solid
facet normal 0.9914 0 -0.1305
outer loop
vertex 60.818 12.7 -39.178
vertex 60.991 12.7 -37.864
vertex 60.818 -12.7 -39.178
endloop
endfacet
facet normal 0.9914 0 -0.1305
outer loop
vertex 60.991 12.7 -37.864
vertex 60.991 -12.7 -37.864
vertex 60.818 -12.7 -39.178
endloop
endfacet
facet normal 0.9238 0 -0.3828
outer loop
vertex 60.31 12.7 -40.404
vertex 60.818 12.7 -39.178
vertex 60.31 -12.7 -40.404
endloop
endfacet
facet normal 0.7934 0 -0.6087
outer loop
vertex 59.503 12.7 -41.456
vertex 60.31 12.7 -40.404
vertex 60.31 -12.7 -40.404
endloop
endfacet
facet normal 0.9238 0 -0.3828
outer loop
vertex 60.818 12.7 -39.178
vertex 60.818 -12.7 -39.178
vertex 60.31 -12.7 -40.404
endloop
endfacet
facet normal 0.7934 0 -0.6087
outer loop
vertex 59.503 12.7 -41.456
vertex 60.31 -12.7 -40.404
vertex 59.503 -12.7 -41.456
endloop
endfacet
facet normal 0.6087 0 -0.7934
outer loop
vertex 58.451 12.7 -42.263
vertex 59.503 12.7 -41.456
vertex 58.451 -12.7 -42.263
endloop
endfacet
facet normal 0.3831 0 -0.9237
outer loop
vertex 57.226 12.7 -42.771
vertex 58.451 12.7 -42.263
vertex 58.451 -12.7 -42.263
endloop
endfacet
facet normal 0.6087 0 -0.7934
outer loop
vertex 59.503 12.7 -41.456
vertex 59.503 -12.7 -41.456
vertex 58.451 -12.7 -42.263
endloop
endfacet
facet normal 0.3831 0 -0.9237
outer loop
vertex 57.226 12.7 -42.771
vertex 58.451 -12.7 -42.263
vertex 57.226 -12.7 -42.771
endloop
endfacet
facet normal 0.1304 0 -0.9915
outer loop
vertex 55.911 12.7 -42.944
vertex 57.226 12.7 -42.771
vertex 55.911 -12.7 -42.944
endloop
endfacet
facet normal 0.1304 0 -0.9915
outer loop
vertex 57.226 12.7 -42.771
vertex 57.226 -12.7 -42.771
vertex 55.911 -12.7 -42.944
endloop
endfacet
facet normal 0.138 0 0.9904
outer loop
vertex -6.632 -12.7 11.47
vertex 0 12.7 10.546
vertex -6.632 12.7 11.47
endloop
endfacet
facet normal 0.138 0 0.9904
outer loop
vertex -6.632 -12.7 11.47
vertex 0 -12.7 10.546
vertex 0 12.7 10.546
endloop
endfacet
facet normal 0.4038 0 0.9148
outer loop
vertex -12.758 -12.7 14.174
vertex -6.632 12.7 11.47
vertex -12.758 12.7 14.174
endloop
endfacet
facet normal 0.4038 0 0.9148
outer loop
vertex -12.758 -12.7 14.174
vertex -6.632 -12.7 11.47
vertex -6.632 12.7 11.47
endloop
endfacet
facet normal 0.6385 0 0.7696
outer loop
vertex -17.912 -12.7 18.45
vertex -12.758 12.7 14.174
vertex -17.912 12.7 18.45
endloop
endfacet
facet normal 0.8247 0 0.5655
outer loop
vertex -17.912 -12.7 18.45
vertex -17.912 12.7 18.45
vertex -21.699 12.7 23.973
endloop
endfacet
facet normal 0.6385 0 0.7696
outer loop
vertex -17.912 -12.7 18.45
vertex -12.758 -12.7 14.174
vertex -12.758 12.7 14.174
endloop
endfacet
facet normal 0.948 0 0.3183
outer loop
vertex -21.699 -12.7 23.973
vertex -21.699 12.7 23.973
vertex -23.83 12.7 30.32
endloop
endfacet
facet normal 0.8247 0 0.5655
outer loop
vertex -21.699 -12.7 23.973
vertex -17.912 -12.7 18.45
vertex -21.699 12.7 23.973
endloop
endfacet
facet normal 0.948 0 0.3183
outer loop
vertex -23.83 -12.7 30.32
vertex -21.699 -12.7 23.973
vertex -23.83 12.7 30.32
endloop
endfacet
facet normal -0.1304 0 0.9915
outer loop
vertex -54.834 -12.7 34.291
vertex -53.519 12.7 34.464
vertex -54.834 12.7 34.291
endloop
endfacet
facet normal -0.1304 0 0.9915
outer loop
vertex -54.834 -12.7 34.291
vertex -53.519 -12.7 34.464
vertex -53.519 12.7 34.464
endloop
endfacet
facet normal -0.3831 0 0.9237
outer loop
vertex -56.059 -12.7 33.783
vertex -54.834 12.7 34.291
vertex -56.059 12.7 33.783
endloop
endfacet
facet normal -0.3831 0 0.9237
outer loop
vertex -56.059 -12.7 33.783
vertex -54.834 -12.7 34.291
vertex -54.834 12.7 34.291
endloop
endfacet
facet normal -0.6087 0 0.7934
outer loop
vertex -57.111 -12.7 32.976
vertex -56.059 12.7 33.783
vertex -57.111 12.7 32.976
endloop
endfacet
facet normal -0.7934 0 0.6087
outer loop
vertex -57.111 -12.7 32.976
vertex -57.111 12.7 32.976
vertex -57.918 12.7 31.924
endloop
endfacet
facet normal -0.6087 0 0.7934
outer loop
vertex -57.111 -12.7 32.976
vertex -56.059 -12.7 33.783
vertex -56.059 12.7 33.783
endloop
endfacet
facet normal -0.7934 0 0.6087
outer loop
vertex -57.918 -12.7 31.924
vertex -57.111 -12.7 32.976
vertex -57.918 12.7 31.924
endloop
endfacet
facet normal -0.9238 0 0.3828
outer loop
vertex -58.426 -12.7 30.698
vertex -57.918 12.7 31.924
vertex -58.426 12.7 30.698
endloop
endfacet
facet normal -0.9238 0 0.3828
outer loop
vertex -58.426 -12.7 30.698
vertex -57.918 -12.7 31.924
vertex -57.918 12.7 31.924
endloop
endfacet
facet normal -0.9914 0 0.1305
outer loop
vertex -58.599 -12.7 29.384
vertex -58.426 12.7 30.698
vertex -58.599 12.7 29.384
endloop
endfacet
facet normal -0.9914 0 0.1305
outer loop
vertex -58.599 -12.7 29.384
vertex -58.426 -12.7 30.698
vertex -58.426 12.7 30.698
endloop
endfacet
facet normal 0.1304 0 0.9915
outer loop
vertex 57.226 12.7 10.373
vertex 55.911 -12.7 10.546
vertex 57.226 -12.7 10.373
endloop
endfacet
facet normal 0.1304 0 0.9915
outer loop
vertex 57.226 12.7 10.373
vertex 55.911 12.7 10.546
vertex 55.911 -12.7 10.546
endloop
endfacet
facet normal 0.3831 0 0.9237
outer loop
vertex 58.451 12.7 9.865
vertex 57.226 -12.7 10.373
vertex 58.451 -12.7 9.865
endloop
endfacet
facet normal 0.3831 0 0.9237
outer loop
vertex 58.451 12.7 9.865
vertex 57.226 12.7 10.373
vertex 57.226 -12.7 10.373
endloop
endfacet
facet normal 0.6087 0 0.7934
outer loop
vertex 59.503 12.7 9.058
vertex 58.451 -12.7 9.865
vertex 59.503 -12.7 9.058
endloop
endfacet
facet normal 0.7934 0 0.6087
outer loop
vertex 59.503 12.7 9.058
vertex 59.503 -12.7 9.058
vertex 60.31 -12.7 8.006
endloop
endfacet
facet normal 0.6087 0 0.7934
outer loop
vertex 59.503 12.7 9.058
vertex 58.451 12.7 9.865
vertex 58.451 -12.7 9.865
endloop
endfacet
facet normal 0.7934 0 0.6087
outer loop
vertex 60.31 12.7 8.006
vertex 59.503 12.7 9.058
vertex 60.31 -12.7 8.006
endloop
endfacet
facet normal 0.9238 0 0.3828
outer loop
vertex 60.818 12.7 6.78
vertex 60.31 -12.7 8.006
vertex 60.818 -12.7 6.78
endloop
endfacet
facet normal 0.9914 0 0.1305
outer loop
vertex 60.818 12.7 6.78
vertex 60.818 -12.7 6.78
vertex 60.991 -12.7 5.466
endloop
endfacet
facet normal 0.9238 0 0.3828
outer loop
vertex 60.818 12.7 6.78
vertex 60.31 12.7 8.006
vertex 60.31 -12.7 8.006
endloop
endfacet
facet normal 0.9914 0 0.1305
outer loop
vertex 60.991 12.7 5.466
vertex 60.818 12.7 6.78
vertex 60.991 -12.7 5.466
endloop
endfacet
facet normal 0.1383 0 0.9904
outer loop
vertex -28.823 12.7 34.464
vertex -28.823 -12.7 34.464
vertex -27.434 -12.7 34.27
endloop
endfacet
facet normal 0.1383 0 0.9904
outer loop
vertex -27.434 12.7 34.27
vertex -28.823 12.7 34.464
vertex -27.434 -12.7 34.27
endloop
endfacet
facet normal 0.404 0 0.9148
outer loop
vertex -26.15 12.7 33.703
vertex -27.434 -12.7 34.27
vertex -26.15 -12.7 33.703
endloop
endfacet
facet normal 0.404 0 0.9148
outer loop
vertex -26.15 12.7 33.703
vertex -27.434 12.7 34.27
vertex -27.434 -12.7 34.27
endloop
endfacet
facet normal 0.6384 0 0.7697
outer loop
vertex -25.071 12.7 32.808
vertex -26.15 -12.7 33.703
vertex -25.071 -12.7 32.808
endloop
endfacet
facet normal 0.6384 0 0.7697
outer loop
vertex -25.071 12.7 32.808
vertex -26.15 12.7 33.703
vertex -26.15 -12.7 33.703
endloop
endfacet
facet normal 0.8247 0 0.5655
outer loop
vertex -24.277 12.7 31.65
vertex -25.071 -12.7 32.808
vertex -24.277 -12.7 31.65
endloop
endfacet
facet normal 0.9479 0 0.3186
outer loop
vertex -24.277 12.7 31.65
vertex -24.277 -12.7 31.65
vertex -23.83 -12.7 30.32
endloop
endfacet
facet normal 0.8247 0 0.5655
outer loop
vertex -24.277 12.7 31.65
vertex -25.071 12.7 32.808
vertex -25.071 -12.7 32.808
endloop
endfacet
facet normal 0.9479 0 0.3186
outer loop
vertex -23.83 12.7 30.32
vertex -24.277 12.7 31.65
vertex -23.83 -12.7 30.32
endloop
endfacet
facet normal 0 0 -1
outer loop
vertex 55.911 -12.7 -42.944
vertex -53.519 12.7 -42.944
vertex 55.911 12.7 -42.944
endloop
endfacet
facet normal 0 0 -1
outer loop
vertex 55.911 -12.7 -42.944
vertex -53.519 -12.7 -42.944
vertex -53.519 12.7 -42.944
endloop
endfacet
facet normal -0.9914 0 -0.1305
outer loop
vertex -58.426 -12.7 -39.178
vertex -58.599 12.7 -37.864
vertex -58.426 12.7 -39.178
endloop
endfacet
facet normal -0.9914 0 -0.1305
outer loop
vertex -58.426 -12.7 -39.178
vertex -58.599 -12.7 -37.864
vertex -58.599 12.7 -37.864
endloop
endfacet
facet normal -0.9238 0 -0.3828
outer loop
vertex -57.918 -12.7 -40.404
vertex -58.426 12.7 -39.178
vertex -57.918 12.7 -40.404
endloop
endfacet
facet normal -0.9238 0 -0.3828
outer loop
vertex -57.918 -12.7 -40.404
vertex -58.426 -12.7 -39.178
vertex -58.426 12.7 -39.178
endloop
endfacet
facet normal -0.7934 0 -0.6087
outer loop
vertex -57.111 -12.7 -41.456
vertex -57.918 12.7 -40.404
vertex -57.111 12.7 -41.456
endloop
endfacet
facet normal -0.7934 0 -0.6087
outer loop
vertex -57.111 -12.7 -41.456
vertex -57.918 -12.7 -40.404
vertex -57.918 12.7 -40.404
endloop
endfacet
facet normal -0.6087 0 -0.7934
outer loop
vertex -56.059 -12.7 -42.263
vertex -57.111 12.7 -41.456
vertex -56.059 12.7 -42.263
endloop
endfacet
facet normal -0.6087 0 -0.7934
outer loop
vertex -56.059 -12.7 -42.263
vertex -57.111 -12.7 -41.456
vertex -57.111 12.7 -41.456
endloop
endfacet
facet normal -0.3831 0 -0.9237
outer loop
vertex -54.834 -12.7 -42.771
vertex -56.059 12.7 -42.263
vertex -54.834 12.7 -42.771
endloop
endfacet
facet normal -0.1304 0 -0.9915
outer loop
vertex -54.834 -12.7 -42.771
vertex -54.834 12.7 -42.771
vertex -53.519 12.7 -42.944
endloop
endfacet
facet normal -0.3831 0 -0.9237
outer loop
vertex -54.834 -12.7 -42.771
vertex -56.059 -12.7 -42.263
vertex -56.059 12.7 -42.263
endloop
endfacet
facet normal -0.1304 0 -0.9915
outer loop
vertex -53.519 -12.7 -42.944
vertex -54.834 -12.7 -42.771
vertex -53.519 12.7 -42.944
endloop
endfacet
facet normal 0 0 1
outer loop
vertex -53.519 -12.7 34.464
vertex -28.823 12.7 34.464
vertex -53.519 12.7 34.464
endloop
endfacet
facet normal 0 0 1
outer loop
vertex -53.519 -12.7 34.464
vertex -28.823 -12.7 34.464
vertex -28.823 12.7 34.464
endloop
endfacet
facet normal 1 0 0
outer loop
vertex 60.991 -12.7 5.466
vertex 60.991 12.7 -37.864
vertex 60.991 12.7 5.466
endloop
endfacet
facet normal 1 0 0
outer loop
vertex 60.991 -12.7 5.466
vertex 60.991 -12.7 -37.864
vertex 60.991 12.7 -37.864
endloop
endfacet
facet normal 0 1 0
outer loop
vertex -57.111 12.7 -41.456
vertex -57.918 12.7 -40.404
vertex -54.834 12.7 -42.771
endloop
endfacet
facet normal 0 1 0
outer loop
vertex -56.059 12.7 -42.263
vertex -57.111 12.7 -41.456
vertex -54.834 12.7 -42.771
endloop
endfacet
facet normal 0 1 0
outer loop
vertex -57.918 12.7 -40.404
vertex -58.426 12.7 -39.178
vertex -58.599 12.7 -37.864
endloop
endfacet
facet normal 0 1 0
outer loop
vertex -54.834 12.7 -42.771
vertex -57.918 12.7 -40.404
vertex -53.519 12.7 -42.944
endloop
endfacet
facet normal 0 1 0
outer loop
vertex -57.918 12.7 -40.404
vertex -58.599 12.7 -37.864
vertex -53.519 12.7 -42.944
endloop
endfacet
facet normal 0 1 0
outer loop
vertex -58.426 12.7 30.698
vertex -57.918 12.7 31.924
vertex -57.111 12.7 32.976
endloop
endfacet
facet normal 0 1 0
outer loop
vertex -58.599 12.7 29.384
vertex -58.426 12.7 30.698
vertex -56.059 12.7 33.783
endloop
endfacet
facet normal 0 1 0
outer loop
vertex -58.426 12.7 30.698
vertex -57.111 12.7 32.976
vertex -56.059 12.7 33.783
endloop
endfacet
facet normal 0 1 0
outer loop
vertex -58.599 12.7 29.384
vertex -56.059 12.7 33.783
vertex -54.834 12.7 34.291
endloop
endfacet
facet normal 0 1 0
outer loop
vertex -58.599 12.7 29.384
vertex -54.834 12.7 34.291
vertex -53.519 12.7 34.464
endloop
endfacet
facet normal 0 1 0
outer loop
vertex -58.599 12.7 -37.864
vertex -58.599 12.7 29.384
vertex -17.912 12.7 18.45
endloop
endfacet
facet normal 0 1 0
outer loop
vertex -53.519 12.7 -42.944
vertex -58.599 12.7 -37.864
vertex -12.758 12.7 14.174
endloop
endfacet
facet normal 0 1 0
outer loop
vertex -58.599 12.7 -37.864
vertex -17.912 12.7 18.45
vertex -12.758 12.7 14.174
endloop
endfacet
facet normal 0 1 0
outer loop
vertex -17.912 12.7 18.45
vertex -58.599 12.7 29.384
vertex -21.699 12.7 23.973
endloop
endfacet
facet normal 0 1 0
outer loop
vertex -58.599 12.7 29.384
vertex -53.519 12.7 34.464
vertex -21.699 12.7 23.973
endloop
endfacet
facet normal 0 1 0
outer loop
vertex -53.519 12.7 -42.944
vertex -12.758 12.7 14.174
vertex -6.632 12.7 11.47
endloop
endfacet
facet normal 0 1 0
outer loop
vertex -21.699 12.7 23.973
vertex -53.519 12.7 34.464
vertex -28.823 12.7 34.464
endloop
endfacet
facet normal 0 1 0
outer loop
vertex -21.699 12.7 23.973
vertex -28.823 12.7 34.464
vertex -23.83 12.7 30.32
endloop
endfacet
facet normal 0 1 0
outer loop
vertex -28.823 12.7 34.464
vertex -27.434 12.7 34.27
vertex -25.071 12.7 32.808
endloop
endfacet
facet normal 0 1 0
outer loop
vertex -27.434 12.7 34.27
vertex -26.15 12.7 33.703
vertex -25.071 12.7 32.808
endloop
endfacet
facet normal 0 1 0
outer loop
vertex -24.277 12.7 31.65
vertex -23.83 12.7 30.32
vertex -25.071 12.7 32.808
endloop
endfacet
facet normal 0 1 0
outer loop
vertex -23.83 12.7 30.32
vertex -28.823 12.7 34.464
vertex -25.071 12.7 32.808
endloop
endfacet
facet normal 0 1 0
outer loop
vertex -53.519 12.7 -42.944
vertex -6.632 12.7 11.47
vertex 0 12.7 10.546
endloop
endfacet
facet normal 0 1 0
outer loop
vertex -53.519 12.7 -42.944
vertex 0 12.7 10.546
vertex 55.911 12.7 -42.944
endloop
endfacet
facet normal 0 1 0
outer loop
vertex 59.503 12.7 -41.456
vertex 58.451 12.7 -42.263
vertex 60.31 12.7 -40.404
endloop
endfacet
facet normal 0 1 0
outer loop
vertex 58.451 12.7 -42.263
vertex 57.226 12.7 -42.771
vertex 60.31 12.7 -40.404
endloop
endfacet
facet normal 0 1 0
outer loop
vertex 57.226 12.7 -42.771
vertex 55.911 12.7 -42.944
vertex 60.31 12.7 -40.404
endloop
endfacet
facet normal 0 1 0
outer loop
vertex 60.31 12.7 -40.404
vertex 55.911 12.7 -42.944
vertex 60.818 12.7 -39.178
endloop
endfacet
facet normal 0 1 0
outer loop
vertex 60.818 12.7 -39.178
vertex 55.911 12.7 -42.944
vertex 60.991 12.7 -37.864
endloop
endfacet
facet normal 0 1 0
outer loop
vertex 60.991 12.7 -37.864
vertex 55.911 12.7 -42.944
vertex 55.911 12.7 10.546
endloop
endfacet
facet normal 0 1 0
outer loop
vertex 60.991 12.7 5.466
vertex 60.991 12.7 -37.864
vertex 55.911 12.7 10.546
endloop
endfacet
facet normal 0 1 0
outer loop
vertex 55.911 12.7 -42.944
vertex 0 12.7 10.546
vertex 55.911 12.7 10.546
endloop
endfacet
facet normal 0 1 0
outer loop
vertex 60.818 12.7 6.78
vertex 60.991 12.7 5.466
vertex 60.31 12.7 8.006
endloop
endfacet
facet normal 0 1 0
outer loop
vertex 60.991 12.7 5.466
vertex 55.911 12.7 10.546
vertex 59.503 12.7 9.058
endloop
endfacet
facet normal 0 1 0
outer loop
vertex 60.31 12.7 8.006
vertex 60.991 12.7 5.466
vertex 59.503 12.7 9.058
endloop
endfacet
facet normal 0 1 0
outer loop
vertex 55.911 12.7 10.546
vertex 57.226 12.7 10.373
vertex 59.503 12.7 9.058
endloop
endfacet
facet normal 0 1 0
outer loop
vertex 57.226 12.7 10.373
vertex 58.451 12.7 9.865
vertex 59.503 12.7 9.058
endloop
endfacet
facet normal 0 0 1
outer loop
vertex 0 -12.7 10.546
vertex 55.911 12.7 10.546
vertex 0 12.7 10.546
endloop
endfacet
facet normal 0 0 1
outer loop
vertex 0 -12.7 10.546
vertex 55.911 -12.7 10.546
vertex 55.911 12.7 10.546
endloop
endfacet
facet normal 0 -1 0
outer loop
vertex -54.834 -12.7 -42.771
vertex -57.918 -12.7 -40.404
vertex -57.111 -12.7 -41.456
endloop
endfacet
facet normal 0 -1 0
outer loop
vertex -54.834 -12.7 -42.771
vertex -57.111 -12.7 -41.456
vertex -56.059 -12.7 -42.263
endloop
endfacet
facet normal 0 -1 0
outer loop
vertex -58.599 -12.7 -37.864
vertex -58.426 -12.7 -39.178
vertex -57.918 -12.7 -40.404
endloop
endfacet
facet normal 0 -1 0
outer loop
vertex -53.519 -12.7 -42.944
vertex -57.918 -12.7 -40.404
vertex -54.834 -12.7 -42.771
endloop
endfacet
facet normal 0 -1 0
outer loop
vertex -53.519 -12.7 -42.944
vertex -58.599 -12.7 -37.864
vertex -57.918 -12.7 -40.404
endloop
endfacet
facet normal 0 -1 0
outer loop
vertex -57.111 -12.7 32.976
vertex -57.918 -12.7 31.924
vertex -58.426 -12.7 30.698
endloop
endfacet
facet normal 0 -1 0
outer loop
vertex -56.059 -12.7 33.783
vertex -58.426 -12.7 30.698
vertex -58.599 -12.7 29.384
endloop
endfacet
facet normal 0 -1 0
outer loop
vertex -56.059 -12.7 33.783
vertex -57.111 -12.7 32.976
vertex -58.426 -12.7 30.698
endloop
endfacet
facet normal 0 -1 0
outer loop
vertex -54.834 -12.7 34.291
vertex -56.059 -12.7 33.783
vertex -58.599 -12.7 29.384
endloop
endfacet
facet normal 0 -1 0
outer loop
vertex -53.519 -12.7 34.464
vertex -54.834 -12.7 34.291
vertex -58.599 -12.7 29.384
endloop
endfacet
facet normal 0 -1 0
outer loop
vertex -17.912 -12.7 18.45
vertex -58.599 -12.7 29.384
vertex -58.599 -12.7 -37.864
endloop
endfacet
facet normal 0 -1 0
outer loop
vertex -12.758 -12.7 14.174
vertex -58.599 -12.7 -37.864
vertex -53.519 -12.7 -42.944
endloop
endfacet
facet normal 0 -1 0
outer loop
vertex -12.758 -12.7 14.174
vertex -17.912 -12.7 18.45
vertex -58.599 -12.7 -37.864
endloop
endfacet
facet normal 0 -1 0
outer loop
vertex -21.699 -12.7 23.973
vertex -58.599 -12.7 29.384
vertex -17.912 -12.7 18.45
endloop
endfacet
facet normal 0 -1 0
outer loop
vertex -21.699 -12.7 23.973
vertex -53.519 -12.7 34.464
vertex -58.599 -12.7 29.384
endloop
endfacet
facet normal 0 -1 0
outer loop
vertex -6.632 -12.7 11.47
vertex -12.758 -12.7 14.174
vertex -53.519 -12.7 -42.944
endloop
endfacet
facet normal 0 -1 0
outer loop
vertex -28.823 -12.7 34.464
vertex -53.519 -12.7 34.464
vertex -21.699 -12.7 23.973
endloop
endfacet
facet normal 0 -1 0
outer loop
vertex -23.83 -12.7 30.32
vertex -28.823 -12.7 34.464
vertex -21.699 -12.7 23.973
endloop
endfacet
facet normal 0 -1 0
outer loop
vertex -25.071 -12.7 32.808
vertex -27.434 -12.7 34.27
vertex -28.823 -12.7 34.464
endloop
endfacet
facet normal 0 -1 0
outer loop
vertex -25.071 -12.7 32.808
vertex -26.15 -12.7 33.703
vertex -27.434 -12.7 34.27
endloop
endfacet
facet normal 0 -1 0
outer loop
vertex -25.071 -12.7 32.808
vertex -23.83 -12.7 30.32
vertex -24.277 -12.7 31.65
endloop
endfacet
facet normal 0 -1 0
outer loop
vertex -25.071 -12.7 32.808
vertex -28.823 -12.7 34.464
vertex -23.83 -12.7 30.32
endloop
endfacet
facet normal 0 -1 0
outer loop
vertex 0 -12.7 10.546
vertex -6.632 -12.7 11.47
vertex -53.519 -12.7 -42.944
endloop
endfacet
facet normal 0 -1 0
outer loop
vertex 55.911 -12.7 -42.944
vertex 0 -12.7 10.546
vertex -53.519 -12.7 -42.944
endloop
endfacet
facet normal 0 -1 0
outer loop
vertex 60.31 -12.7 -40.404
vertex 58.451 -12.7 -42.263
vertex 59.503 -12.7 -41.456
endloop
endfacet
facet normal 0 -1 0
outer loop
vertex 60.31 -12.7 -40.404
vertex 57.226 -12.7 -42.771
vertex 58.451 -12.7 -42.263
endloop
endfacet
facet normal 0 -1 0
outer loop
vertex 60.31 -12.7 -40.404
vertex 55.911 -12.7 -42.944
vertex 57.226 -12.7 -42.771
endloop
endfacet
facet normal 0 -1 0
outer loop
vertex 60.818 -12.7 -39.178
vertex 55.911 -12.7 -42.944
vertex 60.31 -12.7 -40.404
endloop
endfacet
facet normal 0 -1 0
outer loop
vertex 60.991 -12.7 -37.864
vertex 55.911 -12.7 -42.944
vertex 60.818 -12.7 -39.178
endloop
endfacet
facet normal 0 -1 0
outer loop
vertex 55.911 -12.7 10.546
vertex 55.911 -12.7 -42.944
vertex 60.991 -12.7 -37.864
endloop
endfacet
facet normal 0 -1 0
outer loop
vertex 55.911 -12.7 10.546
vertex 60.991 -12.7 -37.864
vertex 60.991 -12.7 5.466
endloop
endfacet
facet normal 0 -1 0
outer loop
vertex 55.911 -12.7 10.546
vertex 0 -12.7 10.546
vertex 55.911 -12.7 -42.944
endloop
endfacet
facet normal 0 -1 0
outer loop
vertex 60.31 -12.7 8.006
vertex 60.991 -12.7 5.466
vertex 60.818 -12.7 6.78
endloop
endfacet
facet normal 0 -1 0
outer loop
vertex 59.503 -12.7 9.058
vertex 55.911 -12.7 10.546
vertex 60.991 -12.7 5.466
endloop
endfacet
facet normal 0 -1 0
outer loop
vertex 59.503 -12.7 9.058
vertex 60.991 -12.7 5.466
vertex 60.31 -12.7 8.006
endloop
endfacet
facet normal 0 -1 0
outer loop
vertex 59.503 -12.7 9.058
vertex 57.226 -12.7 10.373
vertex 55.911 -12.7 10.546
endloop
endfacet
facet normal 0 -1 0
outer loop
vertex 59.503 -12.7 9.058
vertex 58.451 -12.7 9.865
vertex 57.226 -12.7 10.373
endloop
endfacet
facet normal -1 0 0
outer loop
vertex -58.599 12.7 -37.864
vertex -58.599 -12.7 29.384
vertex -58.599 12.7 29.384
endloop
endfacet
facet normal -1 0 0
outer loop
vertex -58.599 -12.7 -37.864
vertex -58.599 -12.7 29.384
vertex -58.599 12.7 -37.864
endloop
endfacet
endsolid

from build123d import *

# Parameters (mm, degrees)
F1_DEPTH = 12.7
F2_R     = 5.08
F3_R     = 5.08


with BuildPart() as f1:
    # F0 (on Front) → F1 (new body, symmetric)
    with BuildSketch(Plane.XZ):
        with BuildLine():
            Line((-24.244117, 34.463618), (-58.59901, 34.463618))
            Line((-58.59901, 34.463618), (-58.59901, -42.943612))
            Line((-58.59901, -42.943612), (60.990814, -42.943612))
            Line((60.990814, -42.943612), (60.990814, 10.545651))
            Line((60.990814, 10.545651), (0, 10.545651))
            ThreePointArc((0, 10.545651), (-17.028258, 17.531533), (-24.244117, 34.463618))
        make_face()
    extrude(amount=F1_DEPTH, both=True)

    # F2
    f2_edges = [f1.edges().sort_by_distance(p)[0] for p in [
        (-58.59901, 0, 34.463618),
        (60.990814, 0, 10.545651),
        (60.990814, 0, -42.943612),
    ]]
    fillet(f2_edges, radius=F2_R)

    # F3
    f3_edges = [f1.edges().sort_by_distance(p)[0] for p in [
        (-58.59901, 0, -42.943612),
        (-24.244117, 0, 34.463618),
    ]]
    fillet(f3_edges, radius=F3_R)


solid = f1.part
